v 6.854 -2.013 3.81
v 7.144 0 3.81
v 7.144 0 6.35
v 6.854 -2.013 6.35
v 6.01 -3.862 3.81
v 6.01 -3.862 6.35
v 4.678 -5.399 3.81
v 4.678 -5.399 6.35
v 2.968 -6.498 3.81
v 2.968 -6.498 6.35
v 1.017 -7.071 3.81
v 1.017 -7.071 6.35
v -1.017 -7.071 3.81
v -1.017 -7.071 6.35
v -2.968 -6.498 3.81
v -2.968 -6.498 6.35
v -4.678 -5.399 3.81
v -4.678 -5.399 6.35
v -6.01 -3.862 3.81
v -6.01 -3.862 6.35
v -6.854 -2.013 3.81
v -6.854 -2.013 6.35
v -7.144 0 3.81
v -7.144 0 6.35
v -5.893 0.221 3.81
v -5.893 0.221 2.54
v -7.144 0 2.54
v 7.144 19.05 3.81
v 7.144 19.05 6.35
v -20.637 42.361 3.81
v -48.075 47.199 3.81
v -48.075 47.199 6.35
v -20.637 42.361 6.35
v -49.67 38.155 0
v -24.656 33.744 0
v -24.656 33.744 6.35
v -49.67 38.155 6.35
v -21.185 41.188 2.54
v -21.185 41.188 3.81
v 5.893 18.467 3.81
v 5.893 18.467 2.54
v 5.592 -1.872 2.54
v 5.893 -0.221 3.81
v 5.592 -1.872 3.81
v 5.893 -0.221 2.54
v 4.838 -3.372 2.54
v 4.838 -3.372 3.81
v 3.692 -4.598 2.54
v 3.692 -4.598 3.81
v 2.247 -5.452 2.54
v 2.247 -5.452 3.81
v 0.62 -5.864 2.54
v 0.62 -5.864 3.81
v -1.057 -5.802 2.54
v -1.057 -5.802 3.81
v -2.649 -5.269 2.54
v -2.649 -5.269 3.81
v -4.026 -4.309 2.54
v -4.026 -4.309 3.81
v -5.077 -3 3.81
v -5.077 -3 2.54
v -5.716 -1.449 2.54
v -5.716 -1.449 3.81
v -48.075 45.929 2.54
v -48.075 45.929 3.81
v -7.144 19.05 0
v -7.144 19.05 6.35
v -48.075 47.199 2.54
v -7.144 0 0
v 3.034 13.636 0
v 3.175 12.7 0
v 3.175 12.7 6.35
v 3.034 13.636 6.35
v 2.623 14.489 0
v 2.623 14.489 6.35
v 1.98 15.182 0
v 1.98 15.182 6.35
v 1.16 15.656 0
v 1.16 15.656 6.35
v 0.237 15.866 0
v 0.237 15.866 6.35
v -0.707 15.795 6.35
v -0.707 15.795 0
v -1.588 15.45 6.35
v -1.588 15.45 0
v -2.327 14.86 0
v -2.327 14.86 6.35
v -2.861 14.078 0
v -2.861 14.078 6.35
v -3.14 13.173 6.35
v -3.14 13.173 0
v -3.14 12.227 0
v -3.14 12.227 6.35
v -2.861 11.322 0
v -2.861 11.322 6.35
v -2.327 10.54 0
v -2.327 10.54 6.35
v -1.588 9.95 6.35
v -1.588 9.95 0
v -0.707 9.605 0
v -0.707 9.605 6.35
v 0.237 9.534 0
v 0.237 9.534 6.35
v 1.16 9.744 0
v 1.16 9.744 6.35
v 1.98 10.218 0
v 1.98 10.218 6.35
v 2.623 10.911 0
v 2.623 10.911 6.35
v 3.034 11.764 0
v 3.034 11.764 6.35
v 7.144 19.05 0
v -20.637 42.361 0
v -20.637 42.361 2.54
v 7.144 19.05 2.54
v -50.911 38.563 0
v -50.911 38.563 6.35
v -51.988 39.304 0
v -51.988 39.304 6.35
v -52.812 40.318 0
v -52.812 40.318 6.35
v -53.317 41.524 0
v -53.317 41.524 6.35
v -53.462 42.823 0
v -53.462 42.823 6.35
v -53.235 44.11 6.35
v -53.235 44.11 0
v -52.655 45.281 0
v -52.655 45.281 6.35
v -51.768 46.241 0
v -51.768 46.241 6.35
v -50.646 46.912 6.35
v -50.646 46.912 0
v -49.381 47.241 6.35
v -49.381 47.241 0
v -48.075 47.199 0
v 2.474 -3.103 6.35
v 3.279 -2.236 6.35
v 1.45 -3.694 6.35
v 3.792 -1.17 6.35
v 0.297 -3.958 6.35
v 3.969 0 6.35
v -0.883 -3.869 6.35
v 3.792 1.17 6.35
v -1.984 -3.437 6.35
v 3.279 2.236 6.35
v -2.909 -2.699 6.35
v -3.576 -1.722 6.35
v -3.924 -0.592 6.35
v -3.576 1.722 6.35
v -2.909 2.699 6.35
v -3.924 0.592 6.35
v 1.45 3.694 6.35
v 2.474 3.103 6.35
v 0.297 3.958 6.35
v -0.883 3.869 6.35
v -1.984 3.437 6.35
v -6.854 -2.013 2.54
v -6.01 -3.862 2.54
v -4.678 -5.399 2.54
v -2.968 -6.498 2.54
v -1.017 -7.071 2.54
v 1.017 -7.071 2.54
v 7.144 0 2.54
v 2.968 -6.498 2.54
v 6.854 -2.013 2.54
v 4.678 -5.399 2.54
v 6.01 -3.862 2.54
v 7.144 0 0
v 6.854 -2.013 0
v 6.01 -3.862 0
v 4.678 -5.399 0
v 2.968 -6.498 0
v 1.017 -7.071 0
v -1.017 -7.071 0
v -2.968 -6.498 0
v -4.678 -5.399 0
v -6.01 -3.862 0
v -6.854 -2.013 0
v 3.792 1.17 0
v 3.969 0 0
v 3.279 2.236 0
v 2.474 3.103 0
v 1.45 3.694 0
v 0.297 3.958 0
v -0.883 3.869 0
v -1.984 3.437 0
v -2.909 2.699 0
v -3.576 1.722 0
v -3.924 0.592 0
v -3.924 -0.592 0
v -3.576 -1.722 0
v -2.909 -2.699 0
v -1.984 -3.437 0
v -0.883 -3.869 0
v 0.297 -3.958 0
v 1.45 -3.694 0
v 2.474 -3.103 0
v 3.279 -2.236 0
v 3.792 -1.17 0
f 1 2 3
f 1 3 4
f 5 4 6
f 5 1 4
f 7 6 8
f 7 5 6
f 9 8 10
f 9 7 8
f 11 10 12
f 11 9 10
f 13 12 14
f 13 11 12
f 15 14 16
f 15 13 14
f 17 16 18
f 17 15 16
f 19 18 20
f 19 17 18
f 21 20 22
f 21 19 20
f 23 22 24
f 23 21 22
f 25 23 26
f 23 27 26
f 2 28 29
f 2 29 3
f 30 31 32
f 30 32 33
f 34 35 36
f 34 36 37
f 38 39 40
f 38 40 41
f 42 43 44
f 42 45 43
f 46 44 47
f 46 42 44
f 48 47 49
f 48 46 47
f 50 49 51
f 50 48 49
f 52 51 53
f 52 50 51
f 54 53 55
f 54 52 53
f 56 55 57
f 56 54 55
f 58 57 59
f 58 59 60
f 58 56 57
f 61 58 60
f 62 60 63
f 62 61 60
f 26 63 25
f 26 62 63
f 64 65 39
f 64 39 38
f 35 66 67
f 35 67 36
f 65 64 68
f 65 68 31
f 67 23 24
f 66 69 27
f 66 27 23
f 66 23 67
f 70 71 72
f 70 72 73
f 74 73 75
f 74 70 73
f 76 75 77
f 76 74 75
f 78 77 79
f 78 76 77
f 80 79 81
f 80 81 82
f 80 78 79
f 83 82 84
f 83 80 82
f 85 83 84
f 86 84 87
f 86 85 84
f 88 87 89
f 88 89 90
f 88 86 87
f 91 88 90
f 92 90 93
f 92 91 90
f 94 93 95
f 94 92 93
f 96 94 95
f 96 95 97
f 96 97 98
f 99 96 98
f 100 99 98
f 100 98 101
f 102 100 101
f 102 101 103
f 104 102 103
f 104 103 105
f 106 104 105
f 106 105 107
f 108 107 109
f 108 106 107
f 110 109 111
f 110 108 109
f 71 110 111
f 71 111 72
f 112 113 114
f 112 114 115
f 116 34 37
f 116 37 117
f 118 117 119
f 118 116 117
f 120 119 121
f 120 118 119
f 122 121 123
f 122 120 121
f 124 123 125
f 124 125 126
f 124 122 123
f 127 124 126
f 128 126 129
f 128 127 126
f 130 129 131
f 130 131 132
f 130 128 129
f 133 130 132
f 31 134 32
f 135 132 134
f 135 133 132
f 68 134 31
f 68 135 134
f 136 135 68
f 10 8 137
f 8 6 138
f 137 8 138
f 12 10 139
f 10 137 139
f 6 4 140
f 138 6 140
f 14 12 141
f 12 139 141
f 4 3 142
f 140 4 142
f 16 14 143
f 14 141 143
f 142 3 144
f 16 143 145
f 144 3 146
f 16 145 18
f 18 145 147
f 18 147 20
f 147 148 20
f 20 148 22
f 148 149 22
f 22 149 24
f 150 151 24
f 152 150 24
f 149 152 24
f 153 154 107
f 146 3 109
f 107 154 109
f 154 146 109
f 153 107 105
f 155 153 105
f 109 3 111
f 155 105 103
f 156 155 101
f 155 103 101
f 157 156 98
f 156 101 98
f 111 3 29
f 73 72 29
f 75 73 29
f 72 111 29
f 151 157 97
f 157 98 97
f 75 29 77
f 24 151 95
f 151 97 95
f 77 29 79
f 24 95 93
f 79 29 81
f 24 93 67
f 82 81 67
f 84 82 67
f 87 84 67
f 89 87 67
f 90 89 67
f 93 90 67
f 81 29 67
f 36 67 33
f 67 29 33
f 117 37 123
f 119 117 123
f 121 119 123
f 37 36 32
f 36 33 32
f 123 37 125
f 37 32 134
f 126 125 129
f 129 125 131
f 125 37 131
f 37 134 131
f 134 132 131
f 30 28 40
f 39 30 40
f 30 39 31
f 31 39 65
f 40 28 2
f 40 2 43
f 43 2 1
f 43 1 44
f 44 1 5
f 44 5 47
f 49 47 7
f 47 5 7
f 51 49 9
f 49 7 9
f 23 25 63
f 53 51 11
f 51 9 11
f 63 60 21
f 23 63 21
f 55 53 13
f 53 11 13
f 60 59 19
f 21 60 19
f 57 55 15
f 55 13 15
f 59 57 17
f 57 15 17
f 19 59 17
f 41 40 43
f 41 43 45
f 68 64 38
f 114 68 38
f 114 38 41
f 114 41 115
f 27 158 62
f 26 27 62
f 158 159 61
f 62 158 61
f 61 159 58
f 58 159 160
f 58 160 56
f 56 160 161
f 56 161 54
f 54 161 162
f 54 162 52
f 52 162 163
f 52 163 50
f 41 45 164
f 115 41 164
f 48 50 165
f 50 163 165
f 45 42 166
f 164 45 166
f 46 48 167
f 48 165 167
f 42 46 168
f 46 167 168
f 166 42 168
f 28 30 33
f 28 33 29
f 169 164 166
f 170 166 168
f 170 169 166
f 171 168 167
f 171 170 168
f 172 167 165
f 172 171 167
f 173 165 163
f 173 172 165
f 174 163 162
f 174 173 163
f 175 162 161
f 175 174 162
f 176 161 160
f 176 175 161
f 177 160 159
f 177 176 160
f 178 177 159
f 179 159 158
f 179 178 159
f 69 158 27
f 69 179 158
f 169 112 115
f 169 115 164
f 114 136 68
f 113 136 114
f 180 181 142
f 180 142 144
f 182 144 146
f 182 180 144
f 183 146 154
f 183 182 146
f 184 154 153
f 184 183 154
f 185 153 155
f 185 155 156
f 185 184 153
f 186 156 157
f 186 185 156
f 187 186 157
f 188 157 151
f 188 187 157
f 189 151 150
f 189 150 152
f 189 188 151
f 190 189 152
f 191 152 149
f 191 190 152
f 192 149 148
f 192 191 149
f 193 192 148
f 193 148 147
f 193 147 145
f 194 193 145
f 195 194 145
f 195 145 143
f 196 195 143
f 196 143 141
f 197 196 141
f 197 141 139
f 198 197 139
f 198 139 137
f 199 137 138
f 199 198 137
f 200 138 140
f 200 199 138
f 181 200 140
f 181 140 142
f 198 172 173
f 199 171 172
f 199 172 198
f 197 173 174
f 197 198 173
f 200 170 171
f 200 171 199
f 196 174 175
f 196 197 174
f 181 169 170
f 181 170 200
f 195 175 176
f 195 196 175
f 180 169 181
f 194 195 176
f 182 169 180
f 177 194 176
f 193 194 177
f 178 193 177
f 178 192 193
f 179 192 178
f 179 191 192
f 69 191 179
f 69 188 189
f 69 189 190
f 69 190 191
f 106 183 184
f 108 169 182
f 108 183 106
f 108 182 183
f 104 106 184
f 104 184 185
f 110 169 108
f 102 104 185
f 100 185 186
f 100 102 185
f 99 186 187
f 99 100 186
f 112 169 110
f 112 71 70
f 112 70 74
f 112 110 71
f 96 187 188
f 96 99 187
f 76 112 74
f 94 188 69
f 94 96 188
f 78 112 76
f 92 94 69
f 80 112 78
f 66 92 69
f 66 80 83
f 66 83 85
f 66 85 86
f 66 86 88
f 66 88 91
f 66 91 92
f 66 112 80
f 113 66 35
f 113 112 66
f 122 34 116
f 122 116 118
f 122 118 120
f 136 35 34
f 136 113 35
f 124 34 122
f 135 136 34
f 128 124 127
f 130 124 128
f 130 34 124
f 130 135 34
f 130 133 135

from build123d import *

# Parameters (mm, degrees)
SKETCH3_R           = 3.96875
SKETCH3_R_2         = 3.175
BOSS_EXTRUDE1_DEPTH = 6.35
SKETCH4_W           = 1.27
SKETCH4_H           = 1.27


with BuildPart() as part:
    # Sketch3 → Boss-Extrude1 (new body)
    with BuildSketch(Plane.XY):
        with BuildLine():
            Line((7.14375, 19.05), (7.14375, 0))
            ThreePointArc((7.14375, 0), (0, -7.14375), (-7.14375, 0))
            Line((-7.14375, 0), (-7.14375, 19.05))
            Line((-7.14375, 19.05), (-24.65552597, 33.744124757))
            Line((-24.65552597, 33.744124757), (-49.669642896, 38.15478847))
            ThreePointArc((-49.669642896, 38.15478847), (-53.394417896, 43.474318461), (-48.074887905, 47.199093461))
            Line((-48.074887905, 47.199093461), (-20.63735676, 42.361116436))
            Line((-20.63735676, 42.361116436), (7.14375, 19.05))
        make_face()
        Circle(SKETCH3_R, mode=Mode.SUBTRACT)
        with Locations((0, 12.7)):
            Circle(SKETCH3_R_2, mode=Mode.SUBTRACT)
    extrude(amount=BOSS_EXTRUDE1_DEPTH)

    # Cut-Sweep1: sweep along a path in Sketch6
    with BuildLine(Plane(origin=(0, 0, 0), x_dir=(-1, 0, 0), z_dir=(0, 0, -1))) as cut_sweep1_path:
        Line((48.074887905, 47.199093461), (20.63735676, 42.361116436))
        Line((20.63735676, 42.361116436), (-7.14375, 19.05))
        Line((-7.14375, 19.05), (-7.14375, 0))
        ThreePointArc((-7.14375, 0), (0, -7.14375), (7.14375, 0))
    # Sketch4 → Cut-Sweep1 (sweep, cut)
    with BuildSketch(Plane(origin=(-48.074887905, 0, 0), x_dir=(0, 0, -1), z_dir=(1, 0, 0))):
        with Locations((-3.175, 46.564093461)):
            Rectangle(SKETCH4_W, SKETCH4_H)
    sweep(path=cut_sweep1_path.line, transition=Transition.RIGHT, mode=Mode.SUBTRACT)


solid = part.part
